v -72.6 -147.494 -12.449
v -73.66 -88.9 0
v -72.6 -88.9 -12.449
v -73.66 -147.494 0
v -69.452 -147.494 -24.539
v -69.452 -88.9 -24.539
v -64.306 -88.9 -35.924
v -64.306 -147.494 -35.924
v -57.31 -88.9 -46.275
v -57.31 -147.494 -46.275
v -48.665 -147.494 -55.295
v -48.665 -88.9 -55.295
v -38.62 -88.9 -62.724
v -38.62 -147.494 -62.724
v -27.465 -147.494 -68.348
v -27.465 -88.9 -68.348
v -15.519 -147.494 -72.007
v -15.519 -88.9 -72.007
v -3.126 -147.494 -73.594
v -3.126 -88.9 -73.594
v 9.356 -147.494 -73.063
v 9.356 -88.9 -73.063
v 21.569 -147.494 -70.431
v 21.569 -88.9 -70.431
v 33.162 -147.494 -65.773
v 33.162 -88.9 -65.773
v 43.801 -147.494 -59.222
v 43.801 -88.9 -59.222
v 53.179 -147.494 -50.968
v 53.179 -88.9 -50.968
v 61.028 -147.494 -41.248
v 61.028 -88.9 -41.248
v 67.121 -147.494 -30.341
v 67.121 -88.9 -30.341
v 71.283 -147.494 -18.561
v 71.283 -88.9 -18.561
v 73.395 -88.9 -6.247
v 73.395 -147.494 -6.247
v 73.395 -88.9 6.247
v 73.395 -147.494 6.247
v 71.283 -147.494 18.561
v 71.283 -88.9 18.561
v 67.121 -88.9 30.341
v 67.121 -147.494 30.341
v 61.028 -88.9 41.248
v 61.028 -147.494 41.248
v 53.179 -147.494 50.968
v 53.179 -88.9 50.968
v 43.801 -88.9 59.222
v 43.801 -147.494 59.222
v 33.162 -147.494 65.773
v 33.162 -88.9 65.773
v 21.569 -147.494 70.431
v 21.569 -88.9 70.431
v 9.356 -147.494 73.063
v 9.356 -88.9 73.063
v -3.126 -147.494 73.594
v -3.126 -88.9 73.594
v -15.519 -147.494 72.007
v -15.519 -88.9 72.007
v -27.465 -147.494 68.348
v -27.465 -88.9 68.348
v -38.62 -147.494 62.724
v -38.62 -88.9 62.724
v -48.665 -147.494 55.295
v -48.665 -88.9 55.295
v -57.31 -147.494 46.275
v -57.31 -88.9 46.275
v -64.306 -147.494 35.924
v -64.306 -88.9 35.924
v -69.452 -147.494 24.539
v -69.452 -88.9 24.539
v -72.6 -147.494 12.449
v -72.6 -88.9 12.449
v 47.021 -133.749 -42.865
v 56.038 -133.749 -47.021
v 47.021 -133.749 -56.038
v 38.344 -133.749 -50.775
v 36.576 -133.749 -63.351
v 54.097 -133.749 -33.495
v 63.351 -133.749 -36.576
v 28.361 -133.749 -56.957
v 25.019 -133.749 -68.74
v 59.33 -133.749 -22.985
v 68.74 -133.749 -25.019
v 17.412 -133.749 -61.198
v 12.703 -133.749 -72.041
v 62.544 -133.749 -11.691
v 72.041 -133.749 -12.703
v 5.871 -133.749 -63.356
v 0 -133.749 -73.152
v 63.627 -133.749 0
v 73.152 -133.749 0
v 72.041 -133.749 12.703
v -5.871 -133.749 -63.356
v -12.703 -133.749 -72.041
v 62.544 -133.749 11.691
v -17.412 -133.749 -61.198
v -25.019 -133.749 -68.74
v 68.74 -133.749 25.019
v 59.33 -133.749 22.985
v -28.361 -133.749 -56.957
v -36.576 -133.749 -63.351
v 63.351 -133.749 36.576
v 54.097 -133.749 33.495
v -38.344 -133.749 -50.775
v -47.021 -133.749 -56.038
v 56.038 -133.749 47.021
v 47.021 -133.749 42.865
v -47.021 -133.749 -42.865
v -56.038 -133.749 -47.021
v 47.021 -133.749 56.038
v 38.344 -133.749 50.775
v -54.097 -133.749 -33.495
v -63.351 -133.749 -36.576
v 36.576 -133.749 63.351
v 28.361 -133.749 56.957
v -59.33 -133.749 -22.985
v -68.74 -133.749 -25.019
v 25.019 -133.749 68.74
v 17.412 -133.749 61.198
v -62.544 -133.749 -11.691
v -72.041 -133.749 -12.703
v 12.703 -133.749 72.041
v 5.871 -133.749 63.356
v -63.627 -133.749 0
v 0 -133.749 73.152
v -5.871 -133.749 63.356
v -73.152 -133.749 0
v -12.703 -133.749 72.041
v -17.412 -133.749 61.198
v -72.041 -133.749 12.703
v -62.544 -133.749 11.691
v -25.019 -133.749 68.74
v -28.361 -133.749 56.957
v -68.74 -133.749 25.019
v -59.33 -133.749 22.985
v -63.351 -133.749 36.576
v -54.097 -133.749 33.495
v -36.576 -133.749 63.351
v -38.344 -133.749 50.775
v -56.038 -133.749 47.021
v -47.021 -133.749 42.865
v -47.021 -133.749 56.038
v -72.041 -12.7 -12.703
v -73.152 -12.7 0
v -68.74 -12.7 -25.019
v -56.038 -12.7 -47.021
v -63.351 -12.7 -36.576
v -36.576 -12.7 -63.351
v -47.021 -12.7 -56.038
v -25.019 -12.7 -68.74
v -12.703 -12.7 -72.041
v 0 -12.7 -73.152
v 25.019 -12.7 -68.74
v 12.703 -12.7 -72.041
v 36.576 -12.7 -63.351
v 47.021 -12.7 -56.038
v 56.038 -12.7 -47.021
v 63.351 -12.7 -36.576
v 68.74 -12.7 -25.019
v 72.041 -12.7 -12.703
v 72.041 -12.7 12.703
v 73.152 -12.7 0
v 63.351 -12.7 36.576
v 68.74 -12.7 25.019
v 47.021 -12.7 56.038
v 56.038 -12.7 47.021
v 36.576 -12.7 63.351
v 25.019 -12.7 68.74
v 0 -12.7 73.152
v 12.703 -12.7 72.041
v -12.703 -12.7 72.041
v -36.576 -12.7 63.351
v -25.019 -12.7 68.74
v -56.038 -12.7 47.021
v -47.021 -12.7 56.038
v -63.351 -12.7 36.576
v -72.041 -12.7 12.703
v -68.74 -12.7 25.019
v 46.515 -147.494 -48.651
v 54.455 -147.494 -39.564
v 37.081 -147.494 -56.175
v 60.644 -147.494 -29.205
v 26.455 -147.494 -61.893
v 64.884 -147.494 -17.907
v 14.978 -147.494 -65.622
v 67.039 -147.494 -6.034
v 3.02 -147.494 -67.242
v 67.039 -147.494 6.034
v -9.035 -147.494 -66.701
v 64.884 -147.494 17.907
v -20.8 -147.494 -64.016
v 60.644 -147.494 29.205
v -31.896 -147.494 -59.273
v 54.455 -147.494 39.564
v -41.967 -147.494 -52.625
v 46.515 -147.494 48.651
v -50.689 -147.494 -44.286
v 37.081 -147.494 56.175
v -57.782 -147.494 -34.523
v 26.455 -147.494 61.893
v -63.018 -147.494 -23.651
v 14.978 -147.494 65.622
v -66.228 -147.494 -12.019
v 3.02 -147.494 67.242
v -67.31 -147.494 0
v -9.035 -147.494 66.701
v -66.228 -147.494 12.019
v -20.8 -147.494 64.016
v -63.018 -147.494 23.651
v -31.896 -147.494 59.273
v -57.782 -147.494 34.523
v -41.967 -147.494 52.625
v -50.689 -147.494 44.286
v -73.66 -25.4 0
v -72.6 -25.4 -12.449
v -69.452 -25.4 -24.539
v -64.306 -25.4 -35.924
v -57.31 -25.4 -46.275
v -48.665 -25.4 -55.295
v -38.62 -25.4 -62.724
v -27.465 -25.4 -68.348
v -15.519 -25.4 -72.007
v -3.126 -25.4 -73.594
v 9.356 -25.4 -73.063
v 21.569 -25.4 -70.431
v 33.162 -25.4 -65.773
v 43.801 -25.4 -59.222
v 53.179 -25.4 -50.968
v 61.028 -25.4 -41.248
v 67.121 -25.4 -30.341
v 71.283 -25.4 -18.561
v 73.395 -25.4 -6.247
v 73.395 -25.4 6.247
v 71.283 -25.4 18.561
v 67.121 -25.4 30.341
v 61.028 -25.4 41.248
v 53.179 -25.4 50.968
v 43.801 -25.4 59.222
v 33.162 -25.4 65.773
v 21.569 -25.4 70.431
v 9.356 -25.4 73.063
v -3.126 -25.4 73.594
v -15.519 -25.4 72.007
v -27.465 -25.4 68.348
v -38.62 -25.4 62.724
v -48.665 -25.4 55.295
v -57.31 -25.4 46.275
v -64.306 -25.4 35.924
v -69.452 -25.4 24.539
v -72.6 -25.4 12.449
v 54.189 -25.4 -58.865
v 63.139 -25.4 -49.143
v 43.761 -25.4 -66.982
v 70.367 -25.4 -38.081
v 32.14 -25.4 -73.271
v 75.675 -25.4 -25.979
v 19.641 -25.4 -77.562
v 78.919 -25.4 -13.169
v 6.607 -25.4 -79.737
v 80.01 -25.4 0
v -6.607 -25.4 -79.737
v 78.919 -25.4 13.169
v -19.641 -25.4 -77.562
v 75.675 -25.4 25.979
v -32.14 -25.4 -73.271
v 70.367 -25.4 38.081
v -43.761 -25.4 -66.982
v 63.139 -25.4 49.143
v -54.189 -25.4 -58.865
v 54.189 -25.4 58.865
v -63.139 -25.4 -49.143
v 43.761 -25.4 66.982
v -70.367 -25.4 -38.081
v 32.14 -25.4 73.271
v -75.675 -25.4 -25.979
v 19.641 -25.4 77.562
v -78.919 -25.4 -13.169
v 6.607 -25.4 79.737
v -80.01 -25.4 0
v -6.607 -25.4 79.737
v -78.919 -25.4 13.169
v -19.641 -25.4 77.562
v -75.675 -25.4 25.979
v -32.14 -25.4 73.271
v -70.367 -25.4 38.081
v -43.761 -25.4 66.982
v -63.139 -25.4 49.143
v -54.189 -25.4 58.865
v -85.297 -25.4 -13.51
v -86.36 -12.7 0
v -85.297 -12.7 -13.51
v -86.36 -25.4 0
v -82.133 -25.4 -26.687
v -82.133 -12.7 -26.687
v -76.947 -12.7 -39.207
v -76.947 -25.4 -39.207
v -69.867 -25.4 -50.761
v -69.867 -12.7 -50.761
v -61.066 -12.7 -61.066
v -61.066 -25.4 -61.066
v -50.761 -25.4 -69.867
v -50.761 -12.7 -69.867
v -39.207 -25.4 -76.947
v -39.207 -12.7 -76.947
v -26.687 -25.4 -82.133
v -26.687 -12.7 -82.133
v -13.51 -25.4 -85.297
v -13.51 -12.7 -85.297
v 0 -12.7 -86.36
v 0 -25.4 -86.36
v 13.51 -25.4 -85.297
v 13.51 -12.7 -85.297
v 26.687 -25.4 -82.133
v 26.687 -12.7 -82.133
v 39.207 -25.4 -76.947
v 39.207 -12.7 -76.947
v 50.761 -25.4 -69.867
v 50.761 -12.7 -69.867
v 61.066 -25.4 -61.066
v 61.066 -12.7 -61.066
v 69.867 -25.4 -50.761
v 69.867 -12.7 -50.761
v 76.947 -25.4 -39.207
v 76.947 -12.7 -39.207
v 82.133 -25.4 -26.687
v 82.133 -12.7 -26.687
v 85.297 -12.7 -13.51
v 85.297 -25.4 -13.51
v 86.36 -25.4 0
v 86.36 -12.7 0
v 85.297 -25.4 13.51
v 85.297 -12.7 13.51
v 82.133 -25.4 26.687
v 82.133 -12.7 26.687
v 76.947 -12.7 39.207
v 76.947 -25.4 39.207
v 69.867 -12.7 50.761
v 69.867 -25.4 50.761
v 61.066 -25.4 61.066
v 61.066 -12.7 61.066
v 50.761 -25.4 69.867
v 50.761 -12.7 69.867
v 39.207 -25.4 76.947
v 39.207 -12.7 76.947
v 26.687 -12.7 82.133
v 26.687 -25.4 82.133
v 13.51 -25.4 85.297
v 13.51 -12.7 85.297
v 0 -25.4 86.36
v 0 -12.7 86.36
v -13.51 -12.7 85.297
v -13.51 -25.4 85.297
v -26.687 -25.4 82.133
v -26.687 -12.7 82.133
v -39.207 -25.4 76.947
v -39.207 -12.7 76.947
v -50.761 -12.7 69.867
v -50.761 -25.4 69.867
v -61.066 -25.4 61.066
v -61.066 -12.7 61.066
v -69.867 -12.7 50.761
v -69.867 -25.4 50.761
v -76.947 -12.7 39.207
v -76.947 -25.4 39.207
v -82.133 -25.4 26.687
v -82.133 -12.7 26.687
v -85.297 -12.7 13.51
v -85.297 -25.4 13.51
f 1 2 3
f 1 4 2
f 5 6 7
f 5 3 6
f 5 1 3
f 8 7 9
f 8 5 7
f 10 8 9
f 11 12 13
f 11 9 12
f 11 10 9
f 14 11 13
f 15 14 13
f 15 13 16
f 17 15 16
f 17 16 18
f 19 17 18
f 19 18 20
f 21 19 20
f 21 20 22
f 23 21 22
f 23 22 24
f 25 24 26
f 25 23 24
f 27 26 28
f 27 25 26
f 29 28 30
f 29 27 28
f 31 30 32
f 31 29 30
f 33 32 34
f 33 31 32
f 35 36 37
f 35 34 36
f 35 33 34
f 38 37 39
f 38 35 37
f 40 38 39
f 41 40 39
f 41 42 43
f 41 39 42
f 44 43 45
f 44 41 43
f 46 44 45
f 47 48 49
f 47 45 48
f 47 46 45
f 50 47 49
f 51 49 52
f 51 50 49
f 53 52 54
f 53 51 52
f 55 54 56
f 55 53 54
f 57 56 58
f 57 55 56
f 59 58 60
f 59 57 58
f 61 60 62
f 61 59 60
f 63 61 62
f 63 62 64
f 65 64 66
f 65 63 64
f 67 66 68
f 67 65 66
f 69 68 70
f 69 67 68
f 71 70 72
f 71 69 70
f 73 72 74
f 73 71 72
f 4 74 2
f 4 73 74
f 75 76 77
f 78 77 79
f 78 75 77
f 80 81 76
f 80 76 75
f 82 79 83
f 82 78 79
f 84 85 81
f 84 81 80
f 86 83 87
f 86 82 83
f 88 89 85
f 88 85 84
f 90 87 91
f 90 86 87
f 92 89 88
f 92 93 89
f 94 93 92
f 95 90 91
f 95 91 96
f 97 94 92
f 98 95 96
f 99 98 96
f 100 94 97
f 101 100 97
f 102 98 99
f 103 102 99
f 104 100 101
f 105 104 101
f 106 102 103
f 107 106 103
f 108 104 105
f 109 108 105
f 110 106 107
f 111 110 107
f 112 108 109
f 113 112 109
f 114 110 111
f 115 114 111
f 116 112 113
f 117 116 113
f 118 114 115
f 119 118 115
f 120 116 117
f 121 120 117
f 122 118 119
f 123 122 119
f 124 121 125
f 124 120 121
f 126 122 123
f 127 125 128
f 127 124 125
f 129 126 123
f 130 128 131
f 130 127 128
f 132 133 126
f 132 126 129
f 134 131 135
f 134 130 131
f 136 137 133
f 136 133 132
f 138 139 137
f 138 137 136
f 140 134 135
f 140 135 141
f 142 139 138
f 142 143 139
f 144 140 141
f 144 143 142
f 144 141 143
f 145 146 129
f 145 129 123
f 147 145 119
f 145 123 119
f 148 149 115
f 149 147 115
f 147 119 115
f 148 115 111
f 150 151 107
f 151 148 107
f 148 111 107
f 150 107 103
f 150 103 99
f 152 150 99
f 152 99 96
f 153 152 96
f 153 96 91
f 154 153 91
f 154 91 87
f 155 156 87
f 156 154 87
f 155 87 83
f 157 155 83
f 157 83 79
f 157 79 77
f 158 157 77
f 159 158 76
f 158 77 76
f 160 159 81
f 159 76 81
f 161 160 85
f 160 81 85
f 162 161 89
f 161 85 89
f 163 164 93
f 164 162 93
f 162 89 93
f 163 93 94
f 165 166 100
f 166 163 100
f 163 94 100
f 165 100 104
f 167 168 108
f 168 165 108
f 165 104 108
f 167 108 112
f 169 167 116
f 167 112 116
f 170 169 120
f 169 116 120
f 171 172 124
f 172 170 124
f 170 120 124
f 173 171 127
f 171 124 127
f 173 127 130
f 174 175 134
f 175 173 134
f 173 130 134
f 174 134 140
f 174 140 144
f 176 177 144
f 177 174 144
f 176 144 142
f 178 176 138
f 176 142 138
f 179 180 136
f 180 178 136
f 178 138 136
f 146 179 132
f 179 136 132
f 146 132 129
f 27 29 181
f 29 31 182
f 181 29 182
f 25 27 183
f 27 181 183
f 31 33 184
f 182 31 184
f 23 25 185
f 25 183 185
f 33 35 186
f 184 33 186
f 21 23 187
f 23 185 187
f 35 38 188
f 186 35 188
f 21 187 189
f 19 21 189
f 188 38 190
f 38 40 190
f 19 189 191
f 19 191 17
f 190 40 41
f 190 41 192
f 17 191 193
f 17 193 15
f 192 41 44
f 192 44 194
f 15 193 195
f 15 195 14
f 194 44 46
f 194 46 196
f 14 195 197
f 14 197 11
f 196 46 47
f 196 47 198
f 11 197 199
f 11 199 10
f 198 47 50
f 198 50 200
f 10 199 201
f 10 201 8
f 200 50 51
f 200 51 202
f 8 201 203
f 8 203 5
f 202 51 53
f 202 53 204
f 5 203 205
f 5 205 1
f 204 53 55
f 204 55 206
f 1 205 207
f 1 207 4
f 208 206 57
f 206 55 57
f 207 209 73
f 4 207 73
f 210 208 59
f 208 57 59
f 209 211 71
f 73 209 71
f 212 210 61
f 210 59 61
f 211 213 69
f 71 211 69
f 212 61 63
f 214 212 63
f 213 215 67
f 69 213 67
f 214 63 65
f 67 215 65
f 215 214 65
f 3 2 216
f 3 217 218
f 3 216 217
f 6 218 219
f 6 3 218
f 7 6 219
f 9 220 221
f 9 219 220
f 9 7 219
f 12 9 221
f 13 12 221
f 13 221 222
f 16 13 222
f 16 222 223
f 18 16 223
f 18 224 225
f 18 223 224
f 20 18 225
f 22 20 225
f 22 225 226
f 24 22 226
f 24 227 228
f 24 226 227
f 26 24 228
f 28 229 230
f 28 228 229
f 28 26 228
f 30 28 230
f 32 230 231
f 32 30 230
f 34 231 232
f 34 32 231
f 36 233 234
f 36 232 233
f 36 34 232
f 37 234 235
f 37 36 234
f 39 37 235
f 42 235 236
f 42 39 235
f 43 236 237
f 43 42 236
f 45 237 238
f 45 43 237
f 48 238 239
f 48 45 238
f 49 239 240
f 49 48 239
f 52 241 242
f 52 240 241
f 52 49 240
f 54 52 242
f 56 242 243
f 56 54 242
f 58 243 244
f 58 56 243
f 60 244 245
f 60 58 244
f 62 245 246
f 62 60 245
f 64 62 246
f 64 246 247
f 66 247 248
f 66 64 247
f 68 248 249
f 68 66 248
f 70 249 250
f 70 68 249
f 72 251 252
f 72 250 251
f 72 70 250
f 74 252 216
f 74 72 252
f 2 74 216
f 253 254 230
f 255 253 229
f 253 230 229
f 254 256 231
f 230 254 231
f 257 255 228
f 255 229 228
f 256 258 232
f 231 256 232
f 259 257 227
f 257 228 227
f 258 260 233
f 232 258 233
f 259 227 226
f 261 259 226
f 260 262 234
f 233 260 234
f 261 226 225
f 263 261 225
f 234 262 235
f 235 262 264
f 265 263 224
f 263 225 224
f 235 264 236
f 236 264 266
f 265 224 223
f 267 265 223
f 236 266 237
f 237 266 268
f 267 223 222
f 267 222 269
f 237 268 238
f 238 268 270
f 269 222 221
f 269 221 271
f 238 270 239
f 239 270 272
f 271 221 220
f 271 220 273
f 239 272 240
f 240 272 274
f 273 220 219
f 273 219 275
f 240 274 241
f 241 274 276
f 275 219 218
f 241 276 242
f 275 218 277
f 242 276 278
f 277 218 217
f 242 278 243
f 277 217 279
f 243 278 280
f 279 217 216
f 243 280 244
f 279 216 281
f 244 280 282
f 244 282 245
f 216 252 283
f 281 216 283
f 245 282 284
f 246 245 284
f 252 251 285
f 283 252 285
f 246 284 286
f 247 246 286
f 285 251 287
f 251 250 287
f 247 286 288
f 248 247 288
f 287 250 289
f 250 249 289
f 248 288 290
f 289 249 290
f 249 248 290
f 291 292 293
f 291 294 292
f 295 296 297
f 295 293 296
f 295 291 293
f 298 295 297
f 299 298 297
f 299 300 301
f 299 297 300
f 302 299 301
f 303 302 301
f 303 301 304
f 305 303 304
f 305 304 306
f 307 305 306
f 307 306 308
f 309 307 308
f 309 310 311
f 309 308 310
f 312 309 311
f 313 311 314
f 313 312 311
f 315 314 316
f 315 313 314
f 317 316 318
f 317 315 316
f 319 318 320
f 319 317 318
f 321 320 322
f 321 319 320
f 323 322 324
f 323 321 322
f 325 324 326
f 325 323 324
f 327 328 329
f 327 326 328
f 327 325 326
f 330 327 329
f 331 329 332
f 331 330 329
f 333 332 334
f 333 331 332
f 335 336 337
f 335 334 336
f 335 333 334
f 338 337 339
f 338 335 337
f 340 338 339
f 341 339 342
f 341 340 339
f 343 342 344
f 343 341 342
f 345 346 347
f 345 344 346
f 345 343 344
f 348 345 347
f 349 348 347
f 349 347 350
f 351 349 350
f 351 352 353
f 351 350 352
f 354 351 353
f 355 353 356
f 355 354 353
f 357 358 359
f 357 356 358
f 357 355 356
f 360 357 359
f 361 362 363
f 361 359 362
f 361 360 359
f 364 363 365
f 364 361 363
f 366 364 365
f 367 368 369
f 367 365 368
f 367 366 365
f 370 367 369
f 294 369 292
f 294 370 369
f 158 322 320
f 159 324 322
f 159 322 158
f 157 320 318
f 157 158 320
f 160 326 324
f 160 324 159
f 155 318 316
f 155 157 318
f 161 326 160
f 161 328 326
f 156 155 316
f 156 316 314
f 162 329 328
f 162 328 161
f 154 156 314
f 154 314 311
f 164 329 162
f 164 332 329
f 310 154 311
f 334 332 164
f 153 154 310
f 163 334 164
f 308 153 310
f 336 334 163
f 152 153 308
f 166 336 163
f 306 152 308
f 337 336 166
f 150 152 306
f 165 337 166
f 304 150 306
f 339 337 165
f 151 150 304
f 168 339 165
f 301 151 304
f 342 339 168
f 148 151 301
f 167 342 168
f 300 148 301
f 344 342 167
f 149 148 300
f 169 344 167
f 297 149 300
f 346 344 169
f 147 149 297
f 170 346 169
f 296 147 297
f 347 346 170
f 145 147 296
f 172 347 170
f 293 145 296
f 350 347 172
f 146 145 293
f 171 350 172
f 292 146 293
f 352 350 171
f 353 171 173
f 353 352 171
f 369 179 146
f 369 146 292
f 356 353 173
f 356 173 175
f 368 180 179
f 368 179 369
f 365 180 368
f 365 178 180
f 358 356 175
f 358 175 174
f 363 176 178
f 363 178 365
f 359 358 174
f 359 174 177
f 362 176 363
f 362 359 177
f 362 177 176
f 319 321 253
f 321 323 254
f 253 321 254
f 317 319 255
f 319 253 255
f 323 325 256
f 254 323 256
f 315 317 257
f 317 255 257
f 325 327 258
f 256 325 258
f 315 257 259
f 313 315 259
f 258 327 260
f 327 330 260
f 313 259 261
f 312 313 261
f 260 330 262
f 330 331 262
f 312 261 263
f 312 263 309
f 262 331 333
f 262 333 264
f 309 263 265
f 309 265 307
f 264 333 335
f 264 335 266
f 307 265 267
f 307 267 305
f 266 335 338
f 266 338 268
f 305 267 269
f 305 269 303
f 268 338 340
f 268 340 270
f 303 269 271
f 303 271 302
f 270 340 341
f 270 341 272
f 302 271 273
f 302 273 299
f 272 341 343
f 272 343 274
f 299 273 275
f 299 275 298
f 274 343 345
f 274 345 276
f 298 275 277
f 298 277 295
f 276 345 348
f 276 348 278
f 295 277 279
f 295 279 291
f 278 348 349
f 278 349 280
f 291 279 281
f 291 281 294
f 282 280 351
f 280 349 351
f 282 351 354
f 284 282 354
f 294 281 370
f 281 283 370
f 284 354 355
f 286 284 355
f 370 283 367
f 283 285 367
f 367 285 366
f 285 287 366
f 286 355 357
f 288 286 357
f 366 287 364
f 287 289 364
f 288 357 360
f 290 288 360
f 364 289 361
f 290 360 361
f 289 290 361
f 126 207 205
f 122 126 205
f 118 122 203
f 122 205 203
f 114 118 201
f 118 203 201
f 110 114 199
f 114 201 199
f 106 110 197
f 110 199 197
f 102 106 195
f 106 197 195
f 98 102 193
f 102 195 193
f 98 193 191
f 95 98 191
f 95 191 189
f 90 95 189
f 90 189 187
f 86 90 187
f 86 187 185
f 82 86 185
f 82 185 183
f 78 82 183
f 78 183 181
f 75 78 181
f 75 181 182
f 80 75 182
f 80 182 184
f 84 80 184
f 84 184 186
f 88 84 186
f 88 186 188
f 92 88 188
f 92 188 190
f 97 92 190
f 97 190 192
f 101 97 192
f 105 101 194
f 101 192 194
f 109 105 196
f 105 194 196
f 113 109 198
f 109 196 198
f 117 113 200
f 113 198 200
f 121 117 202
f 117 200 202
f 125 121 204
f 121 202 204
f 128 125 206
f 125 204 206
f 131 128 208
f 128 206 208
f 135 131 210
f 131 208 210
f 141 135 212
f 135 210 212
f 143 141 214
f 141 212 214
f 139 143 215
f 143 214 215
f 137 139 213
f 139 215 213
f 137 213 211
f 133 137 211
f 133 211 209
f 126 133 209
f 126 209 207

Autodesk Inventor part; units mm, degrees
ref_plane "YZ Plane" through (0, 0, 0) normal (1, 0, 0) x (0, 1, 0)
ref_plane "XZ Plane" through (0, 0, 0) normal (0, 1, 0) x (-1, 0, 0)
ref_plane "XY Plane" through (0, 0, 0) normal (0, 0, 1) x (1, 0, 0)
sketch "Sketch1" plane through (0, 0, 0) normal (0, 0, 1) x (1, 0, 0)
  line L0 (0, 25.4) -> (-28.702, 25.4) construction
  line L1 (0, 25.4) -> (-86.36, 25.4) construction
  line L2 (-86.36, 25.4) -> (-80.01, 25.4) construction
  line L3 (-80.01, 25.4) -> (-73.66, 22.4389) construction
  line L4 (-80.01, 25.4) -> (-80.01, 22.4389) construction
  line L5 (-80.01, 0) -> (-86.36, 0)
  line L6 (-28.702, 59.6457) -> (-28.702, -91.9304) construction
  arc A0 (-28.9184, -4.2142) -> (-32.3684, 3.1843) centre (-35.052, -2.5707) ccw
  line L7 (-67.31, -147.4937) -> (-28.9184, -4.2142)
  line L8 (-80.01, 22.4389) -> (-73.66, 22.4389)
  line L9 (-80.01, 22.4389) -> (-80.01, 0)
  line L10 (-73.66, 22.4389) -> (-32.3684, 3.1843)
  line L11 (-28.702, -2.5707) -> (-60.452, -2.5707) construction
  line L12 (-60.452, 16.28) -> (-60.452, -121.8993) construction
  line L13 (-60.452, -121.8993) -> (-54.102, -121.8993) construction
  line L14 (-54.102, -121.8993) -> (-54.102, -98.2008) construction
  line L15 (-54.102, -98.2008) -> (-60.452, -98.2008)
  line L16 (-60.452, 16.28) -> (-60.452, 6.755) construction
  line L17 (-60.452, 16.28) -> (-60.452, 9.93) construction
  line L18 (-60.452, 9.93) -> (-46.8344, 9.93)
  line L19 (-60.452, 9.93) -> (-60.452, -98.2008)
  line L20 (-86.36, 0) -> (-86.36, -12.7) construction
  line L21 (-60.452, -12.7) -> (-73.152, -12.7) construction
  line L22 (-86.36, -12.7) -> (-86.36, -25.4) construction
  line L23 (-86.36, -25.4) -> (-86.36, -88.9) construction
  line L24 (-86.36, -88.9) -> (-73.66, -88.9) construction
  line L25 (-73.66, -88.9) -> (-73.66, -25.4) construction
  line L26 (-86.36, -25.4) -> (-73.66, -25.4)
  line L27 (-73.66, -25.4) -> (-73.66, -88.9)
  line L28 (-73.66, -88.9) -> (-86.36, -88.9)
  line L29 (-86.36, -12.7) -> (-73.152, -12.7)
  line L30 (-73.152, -133.7486) -> (-63.627, -133.7486)
  line L31 (-73.66, -88.9) -> (-73.66, -147.4937)
  line L32 (-73.66, -147.4937) -> (-67.31, -147.4937)
  line L33 (-73.152, -12.7) -> (-73.152, -133.7486)
  line L34 (-80.01, -25.4) -> (-80.01, -31.3436)
  line L35 (-80.01, -31.3436) -> (-86.36, -31.3436)
  line L36 (-86.36, 0) -> (-86.36, -25.4)
  line L37 (-86.36, -31.3436) -> (-86.36, -88.9)
  line L38 (0, -319.0244) -> (0, 122.7573) projected
  point P0 (0, 0)
  point P1 (-86.36, -255.9127)
  point P2 (-76.835, 22.4389)
  dimension "d0" = 28.702
  dimension "d1" = 86.36
  dimension "d2" = 6.35
  dimension "d3" = 25
  dimension "d5" = 25.4
  dimension "d6" = 25.4
  dimension "d8" = 12.7
  dimension "d11" = 6.35
  dimension "d12" = 31.75
  dimension "d13" = 6.35
  dimension "d15" = 6.35
  dimension "d16" = 12.7
  dimension "d17" = 12.7
  dimension "d18" = 12.7
  dimension "d19" = 63.5
  dimension "d20" = 12.7
  dimension "d22" = 9.525
  dimension "d23" = 6.35
  dimension "d25" = 5.9436
  dimension "d26" = 15
  dimension "d30" = 67.31
revolve "Revolution3" add sketch "Sketch1" angle 360 about axis through (0, -10, 0) along (0, 1, 0) contours L29 L33 L30 L7 L32 L31 L27 L26 L36
properties part number "Carrier Master Sketch"
